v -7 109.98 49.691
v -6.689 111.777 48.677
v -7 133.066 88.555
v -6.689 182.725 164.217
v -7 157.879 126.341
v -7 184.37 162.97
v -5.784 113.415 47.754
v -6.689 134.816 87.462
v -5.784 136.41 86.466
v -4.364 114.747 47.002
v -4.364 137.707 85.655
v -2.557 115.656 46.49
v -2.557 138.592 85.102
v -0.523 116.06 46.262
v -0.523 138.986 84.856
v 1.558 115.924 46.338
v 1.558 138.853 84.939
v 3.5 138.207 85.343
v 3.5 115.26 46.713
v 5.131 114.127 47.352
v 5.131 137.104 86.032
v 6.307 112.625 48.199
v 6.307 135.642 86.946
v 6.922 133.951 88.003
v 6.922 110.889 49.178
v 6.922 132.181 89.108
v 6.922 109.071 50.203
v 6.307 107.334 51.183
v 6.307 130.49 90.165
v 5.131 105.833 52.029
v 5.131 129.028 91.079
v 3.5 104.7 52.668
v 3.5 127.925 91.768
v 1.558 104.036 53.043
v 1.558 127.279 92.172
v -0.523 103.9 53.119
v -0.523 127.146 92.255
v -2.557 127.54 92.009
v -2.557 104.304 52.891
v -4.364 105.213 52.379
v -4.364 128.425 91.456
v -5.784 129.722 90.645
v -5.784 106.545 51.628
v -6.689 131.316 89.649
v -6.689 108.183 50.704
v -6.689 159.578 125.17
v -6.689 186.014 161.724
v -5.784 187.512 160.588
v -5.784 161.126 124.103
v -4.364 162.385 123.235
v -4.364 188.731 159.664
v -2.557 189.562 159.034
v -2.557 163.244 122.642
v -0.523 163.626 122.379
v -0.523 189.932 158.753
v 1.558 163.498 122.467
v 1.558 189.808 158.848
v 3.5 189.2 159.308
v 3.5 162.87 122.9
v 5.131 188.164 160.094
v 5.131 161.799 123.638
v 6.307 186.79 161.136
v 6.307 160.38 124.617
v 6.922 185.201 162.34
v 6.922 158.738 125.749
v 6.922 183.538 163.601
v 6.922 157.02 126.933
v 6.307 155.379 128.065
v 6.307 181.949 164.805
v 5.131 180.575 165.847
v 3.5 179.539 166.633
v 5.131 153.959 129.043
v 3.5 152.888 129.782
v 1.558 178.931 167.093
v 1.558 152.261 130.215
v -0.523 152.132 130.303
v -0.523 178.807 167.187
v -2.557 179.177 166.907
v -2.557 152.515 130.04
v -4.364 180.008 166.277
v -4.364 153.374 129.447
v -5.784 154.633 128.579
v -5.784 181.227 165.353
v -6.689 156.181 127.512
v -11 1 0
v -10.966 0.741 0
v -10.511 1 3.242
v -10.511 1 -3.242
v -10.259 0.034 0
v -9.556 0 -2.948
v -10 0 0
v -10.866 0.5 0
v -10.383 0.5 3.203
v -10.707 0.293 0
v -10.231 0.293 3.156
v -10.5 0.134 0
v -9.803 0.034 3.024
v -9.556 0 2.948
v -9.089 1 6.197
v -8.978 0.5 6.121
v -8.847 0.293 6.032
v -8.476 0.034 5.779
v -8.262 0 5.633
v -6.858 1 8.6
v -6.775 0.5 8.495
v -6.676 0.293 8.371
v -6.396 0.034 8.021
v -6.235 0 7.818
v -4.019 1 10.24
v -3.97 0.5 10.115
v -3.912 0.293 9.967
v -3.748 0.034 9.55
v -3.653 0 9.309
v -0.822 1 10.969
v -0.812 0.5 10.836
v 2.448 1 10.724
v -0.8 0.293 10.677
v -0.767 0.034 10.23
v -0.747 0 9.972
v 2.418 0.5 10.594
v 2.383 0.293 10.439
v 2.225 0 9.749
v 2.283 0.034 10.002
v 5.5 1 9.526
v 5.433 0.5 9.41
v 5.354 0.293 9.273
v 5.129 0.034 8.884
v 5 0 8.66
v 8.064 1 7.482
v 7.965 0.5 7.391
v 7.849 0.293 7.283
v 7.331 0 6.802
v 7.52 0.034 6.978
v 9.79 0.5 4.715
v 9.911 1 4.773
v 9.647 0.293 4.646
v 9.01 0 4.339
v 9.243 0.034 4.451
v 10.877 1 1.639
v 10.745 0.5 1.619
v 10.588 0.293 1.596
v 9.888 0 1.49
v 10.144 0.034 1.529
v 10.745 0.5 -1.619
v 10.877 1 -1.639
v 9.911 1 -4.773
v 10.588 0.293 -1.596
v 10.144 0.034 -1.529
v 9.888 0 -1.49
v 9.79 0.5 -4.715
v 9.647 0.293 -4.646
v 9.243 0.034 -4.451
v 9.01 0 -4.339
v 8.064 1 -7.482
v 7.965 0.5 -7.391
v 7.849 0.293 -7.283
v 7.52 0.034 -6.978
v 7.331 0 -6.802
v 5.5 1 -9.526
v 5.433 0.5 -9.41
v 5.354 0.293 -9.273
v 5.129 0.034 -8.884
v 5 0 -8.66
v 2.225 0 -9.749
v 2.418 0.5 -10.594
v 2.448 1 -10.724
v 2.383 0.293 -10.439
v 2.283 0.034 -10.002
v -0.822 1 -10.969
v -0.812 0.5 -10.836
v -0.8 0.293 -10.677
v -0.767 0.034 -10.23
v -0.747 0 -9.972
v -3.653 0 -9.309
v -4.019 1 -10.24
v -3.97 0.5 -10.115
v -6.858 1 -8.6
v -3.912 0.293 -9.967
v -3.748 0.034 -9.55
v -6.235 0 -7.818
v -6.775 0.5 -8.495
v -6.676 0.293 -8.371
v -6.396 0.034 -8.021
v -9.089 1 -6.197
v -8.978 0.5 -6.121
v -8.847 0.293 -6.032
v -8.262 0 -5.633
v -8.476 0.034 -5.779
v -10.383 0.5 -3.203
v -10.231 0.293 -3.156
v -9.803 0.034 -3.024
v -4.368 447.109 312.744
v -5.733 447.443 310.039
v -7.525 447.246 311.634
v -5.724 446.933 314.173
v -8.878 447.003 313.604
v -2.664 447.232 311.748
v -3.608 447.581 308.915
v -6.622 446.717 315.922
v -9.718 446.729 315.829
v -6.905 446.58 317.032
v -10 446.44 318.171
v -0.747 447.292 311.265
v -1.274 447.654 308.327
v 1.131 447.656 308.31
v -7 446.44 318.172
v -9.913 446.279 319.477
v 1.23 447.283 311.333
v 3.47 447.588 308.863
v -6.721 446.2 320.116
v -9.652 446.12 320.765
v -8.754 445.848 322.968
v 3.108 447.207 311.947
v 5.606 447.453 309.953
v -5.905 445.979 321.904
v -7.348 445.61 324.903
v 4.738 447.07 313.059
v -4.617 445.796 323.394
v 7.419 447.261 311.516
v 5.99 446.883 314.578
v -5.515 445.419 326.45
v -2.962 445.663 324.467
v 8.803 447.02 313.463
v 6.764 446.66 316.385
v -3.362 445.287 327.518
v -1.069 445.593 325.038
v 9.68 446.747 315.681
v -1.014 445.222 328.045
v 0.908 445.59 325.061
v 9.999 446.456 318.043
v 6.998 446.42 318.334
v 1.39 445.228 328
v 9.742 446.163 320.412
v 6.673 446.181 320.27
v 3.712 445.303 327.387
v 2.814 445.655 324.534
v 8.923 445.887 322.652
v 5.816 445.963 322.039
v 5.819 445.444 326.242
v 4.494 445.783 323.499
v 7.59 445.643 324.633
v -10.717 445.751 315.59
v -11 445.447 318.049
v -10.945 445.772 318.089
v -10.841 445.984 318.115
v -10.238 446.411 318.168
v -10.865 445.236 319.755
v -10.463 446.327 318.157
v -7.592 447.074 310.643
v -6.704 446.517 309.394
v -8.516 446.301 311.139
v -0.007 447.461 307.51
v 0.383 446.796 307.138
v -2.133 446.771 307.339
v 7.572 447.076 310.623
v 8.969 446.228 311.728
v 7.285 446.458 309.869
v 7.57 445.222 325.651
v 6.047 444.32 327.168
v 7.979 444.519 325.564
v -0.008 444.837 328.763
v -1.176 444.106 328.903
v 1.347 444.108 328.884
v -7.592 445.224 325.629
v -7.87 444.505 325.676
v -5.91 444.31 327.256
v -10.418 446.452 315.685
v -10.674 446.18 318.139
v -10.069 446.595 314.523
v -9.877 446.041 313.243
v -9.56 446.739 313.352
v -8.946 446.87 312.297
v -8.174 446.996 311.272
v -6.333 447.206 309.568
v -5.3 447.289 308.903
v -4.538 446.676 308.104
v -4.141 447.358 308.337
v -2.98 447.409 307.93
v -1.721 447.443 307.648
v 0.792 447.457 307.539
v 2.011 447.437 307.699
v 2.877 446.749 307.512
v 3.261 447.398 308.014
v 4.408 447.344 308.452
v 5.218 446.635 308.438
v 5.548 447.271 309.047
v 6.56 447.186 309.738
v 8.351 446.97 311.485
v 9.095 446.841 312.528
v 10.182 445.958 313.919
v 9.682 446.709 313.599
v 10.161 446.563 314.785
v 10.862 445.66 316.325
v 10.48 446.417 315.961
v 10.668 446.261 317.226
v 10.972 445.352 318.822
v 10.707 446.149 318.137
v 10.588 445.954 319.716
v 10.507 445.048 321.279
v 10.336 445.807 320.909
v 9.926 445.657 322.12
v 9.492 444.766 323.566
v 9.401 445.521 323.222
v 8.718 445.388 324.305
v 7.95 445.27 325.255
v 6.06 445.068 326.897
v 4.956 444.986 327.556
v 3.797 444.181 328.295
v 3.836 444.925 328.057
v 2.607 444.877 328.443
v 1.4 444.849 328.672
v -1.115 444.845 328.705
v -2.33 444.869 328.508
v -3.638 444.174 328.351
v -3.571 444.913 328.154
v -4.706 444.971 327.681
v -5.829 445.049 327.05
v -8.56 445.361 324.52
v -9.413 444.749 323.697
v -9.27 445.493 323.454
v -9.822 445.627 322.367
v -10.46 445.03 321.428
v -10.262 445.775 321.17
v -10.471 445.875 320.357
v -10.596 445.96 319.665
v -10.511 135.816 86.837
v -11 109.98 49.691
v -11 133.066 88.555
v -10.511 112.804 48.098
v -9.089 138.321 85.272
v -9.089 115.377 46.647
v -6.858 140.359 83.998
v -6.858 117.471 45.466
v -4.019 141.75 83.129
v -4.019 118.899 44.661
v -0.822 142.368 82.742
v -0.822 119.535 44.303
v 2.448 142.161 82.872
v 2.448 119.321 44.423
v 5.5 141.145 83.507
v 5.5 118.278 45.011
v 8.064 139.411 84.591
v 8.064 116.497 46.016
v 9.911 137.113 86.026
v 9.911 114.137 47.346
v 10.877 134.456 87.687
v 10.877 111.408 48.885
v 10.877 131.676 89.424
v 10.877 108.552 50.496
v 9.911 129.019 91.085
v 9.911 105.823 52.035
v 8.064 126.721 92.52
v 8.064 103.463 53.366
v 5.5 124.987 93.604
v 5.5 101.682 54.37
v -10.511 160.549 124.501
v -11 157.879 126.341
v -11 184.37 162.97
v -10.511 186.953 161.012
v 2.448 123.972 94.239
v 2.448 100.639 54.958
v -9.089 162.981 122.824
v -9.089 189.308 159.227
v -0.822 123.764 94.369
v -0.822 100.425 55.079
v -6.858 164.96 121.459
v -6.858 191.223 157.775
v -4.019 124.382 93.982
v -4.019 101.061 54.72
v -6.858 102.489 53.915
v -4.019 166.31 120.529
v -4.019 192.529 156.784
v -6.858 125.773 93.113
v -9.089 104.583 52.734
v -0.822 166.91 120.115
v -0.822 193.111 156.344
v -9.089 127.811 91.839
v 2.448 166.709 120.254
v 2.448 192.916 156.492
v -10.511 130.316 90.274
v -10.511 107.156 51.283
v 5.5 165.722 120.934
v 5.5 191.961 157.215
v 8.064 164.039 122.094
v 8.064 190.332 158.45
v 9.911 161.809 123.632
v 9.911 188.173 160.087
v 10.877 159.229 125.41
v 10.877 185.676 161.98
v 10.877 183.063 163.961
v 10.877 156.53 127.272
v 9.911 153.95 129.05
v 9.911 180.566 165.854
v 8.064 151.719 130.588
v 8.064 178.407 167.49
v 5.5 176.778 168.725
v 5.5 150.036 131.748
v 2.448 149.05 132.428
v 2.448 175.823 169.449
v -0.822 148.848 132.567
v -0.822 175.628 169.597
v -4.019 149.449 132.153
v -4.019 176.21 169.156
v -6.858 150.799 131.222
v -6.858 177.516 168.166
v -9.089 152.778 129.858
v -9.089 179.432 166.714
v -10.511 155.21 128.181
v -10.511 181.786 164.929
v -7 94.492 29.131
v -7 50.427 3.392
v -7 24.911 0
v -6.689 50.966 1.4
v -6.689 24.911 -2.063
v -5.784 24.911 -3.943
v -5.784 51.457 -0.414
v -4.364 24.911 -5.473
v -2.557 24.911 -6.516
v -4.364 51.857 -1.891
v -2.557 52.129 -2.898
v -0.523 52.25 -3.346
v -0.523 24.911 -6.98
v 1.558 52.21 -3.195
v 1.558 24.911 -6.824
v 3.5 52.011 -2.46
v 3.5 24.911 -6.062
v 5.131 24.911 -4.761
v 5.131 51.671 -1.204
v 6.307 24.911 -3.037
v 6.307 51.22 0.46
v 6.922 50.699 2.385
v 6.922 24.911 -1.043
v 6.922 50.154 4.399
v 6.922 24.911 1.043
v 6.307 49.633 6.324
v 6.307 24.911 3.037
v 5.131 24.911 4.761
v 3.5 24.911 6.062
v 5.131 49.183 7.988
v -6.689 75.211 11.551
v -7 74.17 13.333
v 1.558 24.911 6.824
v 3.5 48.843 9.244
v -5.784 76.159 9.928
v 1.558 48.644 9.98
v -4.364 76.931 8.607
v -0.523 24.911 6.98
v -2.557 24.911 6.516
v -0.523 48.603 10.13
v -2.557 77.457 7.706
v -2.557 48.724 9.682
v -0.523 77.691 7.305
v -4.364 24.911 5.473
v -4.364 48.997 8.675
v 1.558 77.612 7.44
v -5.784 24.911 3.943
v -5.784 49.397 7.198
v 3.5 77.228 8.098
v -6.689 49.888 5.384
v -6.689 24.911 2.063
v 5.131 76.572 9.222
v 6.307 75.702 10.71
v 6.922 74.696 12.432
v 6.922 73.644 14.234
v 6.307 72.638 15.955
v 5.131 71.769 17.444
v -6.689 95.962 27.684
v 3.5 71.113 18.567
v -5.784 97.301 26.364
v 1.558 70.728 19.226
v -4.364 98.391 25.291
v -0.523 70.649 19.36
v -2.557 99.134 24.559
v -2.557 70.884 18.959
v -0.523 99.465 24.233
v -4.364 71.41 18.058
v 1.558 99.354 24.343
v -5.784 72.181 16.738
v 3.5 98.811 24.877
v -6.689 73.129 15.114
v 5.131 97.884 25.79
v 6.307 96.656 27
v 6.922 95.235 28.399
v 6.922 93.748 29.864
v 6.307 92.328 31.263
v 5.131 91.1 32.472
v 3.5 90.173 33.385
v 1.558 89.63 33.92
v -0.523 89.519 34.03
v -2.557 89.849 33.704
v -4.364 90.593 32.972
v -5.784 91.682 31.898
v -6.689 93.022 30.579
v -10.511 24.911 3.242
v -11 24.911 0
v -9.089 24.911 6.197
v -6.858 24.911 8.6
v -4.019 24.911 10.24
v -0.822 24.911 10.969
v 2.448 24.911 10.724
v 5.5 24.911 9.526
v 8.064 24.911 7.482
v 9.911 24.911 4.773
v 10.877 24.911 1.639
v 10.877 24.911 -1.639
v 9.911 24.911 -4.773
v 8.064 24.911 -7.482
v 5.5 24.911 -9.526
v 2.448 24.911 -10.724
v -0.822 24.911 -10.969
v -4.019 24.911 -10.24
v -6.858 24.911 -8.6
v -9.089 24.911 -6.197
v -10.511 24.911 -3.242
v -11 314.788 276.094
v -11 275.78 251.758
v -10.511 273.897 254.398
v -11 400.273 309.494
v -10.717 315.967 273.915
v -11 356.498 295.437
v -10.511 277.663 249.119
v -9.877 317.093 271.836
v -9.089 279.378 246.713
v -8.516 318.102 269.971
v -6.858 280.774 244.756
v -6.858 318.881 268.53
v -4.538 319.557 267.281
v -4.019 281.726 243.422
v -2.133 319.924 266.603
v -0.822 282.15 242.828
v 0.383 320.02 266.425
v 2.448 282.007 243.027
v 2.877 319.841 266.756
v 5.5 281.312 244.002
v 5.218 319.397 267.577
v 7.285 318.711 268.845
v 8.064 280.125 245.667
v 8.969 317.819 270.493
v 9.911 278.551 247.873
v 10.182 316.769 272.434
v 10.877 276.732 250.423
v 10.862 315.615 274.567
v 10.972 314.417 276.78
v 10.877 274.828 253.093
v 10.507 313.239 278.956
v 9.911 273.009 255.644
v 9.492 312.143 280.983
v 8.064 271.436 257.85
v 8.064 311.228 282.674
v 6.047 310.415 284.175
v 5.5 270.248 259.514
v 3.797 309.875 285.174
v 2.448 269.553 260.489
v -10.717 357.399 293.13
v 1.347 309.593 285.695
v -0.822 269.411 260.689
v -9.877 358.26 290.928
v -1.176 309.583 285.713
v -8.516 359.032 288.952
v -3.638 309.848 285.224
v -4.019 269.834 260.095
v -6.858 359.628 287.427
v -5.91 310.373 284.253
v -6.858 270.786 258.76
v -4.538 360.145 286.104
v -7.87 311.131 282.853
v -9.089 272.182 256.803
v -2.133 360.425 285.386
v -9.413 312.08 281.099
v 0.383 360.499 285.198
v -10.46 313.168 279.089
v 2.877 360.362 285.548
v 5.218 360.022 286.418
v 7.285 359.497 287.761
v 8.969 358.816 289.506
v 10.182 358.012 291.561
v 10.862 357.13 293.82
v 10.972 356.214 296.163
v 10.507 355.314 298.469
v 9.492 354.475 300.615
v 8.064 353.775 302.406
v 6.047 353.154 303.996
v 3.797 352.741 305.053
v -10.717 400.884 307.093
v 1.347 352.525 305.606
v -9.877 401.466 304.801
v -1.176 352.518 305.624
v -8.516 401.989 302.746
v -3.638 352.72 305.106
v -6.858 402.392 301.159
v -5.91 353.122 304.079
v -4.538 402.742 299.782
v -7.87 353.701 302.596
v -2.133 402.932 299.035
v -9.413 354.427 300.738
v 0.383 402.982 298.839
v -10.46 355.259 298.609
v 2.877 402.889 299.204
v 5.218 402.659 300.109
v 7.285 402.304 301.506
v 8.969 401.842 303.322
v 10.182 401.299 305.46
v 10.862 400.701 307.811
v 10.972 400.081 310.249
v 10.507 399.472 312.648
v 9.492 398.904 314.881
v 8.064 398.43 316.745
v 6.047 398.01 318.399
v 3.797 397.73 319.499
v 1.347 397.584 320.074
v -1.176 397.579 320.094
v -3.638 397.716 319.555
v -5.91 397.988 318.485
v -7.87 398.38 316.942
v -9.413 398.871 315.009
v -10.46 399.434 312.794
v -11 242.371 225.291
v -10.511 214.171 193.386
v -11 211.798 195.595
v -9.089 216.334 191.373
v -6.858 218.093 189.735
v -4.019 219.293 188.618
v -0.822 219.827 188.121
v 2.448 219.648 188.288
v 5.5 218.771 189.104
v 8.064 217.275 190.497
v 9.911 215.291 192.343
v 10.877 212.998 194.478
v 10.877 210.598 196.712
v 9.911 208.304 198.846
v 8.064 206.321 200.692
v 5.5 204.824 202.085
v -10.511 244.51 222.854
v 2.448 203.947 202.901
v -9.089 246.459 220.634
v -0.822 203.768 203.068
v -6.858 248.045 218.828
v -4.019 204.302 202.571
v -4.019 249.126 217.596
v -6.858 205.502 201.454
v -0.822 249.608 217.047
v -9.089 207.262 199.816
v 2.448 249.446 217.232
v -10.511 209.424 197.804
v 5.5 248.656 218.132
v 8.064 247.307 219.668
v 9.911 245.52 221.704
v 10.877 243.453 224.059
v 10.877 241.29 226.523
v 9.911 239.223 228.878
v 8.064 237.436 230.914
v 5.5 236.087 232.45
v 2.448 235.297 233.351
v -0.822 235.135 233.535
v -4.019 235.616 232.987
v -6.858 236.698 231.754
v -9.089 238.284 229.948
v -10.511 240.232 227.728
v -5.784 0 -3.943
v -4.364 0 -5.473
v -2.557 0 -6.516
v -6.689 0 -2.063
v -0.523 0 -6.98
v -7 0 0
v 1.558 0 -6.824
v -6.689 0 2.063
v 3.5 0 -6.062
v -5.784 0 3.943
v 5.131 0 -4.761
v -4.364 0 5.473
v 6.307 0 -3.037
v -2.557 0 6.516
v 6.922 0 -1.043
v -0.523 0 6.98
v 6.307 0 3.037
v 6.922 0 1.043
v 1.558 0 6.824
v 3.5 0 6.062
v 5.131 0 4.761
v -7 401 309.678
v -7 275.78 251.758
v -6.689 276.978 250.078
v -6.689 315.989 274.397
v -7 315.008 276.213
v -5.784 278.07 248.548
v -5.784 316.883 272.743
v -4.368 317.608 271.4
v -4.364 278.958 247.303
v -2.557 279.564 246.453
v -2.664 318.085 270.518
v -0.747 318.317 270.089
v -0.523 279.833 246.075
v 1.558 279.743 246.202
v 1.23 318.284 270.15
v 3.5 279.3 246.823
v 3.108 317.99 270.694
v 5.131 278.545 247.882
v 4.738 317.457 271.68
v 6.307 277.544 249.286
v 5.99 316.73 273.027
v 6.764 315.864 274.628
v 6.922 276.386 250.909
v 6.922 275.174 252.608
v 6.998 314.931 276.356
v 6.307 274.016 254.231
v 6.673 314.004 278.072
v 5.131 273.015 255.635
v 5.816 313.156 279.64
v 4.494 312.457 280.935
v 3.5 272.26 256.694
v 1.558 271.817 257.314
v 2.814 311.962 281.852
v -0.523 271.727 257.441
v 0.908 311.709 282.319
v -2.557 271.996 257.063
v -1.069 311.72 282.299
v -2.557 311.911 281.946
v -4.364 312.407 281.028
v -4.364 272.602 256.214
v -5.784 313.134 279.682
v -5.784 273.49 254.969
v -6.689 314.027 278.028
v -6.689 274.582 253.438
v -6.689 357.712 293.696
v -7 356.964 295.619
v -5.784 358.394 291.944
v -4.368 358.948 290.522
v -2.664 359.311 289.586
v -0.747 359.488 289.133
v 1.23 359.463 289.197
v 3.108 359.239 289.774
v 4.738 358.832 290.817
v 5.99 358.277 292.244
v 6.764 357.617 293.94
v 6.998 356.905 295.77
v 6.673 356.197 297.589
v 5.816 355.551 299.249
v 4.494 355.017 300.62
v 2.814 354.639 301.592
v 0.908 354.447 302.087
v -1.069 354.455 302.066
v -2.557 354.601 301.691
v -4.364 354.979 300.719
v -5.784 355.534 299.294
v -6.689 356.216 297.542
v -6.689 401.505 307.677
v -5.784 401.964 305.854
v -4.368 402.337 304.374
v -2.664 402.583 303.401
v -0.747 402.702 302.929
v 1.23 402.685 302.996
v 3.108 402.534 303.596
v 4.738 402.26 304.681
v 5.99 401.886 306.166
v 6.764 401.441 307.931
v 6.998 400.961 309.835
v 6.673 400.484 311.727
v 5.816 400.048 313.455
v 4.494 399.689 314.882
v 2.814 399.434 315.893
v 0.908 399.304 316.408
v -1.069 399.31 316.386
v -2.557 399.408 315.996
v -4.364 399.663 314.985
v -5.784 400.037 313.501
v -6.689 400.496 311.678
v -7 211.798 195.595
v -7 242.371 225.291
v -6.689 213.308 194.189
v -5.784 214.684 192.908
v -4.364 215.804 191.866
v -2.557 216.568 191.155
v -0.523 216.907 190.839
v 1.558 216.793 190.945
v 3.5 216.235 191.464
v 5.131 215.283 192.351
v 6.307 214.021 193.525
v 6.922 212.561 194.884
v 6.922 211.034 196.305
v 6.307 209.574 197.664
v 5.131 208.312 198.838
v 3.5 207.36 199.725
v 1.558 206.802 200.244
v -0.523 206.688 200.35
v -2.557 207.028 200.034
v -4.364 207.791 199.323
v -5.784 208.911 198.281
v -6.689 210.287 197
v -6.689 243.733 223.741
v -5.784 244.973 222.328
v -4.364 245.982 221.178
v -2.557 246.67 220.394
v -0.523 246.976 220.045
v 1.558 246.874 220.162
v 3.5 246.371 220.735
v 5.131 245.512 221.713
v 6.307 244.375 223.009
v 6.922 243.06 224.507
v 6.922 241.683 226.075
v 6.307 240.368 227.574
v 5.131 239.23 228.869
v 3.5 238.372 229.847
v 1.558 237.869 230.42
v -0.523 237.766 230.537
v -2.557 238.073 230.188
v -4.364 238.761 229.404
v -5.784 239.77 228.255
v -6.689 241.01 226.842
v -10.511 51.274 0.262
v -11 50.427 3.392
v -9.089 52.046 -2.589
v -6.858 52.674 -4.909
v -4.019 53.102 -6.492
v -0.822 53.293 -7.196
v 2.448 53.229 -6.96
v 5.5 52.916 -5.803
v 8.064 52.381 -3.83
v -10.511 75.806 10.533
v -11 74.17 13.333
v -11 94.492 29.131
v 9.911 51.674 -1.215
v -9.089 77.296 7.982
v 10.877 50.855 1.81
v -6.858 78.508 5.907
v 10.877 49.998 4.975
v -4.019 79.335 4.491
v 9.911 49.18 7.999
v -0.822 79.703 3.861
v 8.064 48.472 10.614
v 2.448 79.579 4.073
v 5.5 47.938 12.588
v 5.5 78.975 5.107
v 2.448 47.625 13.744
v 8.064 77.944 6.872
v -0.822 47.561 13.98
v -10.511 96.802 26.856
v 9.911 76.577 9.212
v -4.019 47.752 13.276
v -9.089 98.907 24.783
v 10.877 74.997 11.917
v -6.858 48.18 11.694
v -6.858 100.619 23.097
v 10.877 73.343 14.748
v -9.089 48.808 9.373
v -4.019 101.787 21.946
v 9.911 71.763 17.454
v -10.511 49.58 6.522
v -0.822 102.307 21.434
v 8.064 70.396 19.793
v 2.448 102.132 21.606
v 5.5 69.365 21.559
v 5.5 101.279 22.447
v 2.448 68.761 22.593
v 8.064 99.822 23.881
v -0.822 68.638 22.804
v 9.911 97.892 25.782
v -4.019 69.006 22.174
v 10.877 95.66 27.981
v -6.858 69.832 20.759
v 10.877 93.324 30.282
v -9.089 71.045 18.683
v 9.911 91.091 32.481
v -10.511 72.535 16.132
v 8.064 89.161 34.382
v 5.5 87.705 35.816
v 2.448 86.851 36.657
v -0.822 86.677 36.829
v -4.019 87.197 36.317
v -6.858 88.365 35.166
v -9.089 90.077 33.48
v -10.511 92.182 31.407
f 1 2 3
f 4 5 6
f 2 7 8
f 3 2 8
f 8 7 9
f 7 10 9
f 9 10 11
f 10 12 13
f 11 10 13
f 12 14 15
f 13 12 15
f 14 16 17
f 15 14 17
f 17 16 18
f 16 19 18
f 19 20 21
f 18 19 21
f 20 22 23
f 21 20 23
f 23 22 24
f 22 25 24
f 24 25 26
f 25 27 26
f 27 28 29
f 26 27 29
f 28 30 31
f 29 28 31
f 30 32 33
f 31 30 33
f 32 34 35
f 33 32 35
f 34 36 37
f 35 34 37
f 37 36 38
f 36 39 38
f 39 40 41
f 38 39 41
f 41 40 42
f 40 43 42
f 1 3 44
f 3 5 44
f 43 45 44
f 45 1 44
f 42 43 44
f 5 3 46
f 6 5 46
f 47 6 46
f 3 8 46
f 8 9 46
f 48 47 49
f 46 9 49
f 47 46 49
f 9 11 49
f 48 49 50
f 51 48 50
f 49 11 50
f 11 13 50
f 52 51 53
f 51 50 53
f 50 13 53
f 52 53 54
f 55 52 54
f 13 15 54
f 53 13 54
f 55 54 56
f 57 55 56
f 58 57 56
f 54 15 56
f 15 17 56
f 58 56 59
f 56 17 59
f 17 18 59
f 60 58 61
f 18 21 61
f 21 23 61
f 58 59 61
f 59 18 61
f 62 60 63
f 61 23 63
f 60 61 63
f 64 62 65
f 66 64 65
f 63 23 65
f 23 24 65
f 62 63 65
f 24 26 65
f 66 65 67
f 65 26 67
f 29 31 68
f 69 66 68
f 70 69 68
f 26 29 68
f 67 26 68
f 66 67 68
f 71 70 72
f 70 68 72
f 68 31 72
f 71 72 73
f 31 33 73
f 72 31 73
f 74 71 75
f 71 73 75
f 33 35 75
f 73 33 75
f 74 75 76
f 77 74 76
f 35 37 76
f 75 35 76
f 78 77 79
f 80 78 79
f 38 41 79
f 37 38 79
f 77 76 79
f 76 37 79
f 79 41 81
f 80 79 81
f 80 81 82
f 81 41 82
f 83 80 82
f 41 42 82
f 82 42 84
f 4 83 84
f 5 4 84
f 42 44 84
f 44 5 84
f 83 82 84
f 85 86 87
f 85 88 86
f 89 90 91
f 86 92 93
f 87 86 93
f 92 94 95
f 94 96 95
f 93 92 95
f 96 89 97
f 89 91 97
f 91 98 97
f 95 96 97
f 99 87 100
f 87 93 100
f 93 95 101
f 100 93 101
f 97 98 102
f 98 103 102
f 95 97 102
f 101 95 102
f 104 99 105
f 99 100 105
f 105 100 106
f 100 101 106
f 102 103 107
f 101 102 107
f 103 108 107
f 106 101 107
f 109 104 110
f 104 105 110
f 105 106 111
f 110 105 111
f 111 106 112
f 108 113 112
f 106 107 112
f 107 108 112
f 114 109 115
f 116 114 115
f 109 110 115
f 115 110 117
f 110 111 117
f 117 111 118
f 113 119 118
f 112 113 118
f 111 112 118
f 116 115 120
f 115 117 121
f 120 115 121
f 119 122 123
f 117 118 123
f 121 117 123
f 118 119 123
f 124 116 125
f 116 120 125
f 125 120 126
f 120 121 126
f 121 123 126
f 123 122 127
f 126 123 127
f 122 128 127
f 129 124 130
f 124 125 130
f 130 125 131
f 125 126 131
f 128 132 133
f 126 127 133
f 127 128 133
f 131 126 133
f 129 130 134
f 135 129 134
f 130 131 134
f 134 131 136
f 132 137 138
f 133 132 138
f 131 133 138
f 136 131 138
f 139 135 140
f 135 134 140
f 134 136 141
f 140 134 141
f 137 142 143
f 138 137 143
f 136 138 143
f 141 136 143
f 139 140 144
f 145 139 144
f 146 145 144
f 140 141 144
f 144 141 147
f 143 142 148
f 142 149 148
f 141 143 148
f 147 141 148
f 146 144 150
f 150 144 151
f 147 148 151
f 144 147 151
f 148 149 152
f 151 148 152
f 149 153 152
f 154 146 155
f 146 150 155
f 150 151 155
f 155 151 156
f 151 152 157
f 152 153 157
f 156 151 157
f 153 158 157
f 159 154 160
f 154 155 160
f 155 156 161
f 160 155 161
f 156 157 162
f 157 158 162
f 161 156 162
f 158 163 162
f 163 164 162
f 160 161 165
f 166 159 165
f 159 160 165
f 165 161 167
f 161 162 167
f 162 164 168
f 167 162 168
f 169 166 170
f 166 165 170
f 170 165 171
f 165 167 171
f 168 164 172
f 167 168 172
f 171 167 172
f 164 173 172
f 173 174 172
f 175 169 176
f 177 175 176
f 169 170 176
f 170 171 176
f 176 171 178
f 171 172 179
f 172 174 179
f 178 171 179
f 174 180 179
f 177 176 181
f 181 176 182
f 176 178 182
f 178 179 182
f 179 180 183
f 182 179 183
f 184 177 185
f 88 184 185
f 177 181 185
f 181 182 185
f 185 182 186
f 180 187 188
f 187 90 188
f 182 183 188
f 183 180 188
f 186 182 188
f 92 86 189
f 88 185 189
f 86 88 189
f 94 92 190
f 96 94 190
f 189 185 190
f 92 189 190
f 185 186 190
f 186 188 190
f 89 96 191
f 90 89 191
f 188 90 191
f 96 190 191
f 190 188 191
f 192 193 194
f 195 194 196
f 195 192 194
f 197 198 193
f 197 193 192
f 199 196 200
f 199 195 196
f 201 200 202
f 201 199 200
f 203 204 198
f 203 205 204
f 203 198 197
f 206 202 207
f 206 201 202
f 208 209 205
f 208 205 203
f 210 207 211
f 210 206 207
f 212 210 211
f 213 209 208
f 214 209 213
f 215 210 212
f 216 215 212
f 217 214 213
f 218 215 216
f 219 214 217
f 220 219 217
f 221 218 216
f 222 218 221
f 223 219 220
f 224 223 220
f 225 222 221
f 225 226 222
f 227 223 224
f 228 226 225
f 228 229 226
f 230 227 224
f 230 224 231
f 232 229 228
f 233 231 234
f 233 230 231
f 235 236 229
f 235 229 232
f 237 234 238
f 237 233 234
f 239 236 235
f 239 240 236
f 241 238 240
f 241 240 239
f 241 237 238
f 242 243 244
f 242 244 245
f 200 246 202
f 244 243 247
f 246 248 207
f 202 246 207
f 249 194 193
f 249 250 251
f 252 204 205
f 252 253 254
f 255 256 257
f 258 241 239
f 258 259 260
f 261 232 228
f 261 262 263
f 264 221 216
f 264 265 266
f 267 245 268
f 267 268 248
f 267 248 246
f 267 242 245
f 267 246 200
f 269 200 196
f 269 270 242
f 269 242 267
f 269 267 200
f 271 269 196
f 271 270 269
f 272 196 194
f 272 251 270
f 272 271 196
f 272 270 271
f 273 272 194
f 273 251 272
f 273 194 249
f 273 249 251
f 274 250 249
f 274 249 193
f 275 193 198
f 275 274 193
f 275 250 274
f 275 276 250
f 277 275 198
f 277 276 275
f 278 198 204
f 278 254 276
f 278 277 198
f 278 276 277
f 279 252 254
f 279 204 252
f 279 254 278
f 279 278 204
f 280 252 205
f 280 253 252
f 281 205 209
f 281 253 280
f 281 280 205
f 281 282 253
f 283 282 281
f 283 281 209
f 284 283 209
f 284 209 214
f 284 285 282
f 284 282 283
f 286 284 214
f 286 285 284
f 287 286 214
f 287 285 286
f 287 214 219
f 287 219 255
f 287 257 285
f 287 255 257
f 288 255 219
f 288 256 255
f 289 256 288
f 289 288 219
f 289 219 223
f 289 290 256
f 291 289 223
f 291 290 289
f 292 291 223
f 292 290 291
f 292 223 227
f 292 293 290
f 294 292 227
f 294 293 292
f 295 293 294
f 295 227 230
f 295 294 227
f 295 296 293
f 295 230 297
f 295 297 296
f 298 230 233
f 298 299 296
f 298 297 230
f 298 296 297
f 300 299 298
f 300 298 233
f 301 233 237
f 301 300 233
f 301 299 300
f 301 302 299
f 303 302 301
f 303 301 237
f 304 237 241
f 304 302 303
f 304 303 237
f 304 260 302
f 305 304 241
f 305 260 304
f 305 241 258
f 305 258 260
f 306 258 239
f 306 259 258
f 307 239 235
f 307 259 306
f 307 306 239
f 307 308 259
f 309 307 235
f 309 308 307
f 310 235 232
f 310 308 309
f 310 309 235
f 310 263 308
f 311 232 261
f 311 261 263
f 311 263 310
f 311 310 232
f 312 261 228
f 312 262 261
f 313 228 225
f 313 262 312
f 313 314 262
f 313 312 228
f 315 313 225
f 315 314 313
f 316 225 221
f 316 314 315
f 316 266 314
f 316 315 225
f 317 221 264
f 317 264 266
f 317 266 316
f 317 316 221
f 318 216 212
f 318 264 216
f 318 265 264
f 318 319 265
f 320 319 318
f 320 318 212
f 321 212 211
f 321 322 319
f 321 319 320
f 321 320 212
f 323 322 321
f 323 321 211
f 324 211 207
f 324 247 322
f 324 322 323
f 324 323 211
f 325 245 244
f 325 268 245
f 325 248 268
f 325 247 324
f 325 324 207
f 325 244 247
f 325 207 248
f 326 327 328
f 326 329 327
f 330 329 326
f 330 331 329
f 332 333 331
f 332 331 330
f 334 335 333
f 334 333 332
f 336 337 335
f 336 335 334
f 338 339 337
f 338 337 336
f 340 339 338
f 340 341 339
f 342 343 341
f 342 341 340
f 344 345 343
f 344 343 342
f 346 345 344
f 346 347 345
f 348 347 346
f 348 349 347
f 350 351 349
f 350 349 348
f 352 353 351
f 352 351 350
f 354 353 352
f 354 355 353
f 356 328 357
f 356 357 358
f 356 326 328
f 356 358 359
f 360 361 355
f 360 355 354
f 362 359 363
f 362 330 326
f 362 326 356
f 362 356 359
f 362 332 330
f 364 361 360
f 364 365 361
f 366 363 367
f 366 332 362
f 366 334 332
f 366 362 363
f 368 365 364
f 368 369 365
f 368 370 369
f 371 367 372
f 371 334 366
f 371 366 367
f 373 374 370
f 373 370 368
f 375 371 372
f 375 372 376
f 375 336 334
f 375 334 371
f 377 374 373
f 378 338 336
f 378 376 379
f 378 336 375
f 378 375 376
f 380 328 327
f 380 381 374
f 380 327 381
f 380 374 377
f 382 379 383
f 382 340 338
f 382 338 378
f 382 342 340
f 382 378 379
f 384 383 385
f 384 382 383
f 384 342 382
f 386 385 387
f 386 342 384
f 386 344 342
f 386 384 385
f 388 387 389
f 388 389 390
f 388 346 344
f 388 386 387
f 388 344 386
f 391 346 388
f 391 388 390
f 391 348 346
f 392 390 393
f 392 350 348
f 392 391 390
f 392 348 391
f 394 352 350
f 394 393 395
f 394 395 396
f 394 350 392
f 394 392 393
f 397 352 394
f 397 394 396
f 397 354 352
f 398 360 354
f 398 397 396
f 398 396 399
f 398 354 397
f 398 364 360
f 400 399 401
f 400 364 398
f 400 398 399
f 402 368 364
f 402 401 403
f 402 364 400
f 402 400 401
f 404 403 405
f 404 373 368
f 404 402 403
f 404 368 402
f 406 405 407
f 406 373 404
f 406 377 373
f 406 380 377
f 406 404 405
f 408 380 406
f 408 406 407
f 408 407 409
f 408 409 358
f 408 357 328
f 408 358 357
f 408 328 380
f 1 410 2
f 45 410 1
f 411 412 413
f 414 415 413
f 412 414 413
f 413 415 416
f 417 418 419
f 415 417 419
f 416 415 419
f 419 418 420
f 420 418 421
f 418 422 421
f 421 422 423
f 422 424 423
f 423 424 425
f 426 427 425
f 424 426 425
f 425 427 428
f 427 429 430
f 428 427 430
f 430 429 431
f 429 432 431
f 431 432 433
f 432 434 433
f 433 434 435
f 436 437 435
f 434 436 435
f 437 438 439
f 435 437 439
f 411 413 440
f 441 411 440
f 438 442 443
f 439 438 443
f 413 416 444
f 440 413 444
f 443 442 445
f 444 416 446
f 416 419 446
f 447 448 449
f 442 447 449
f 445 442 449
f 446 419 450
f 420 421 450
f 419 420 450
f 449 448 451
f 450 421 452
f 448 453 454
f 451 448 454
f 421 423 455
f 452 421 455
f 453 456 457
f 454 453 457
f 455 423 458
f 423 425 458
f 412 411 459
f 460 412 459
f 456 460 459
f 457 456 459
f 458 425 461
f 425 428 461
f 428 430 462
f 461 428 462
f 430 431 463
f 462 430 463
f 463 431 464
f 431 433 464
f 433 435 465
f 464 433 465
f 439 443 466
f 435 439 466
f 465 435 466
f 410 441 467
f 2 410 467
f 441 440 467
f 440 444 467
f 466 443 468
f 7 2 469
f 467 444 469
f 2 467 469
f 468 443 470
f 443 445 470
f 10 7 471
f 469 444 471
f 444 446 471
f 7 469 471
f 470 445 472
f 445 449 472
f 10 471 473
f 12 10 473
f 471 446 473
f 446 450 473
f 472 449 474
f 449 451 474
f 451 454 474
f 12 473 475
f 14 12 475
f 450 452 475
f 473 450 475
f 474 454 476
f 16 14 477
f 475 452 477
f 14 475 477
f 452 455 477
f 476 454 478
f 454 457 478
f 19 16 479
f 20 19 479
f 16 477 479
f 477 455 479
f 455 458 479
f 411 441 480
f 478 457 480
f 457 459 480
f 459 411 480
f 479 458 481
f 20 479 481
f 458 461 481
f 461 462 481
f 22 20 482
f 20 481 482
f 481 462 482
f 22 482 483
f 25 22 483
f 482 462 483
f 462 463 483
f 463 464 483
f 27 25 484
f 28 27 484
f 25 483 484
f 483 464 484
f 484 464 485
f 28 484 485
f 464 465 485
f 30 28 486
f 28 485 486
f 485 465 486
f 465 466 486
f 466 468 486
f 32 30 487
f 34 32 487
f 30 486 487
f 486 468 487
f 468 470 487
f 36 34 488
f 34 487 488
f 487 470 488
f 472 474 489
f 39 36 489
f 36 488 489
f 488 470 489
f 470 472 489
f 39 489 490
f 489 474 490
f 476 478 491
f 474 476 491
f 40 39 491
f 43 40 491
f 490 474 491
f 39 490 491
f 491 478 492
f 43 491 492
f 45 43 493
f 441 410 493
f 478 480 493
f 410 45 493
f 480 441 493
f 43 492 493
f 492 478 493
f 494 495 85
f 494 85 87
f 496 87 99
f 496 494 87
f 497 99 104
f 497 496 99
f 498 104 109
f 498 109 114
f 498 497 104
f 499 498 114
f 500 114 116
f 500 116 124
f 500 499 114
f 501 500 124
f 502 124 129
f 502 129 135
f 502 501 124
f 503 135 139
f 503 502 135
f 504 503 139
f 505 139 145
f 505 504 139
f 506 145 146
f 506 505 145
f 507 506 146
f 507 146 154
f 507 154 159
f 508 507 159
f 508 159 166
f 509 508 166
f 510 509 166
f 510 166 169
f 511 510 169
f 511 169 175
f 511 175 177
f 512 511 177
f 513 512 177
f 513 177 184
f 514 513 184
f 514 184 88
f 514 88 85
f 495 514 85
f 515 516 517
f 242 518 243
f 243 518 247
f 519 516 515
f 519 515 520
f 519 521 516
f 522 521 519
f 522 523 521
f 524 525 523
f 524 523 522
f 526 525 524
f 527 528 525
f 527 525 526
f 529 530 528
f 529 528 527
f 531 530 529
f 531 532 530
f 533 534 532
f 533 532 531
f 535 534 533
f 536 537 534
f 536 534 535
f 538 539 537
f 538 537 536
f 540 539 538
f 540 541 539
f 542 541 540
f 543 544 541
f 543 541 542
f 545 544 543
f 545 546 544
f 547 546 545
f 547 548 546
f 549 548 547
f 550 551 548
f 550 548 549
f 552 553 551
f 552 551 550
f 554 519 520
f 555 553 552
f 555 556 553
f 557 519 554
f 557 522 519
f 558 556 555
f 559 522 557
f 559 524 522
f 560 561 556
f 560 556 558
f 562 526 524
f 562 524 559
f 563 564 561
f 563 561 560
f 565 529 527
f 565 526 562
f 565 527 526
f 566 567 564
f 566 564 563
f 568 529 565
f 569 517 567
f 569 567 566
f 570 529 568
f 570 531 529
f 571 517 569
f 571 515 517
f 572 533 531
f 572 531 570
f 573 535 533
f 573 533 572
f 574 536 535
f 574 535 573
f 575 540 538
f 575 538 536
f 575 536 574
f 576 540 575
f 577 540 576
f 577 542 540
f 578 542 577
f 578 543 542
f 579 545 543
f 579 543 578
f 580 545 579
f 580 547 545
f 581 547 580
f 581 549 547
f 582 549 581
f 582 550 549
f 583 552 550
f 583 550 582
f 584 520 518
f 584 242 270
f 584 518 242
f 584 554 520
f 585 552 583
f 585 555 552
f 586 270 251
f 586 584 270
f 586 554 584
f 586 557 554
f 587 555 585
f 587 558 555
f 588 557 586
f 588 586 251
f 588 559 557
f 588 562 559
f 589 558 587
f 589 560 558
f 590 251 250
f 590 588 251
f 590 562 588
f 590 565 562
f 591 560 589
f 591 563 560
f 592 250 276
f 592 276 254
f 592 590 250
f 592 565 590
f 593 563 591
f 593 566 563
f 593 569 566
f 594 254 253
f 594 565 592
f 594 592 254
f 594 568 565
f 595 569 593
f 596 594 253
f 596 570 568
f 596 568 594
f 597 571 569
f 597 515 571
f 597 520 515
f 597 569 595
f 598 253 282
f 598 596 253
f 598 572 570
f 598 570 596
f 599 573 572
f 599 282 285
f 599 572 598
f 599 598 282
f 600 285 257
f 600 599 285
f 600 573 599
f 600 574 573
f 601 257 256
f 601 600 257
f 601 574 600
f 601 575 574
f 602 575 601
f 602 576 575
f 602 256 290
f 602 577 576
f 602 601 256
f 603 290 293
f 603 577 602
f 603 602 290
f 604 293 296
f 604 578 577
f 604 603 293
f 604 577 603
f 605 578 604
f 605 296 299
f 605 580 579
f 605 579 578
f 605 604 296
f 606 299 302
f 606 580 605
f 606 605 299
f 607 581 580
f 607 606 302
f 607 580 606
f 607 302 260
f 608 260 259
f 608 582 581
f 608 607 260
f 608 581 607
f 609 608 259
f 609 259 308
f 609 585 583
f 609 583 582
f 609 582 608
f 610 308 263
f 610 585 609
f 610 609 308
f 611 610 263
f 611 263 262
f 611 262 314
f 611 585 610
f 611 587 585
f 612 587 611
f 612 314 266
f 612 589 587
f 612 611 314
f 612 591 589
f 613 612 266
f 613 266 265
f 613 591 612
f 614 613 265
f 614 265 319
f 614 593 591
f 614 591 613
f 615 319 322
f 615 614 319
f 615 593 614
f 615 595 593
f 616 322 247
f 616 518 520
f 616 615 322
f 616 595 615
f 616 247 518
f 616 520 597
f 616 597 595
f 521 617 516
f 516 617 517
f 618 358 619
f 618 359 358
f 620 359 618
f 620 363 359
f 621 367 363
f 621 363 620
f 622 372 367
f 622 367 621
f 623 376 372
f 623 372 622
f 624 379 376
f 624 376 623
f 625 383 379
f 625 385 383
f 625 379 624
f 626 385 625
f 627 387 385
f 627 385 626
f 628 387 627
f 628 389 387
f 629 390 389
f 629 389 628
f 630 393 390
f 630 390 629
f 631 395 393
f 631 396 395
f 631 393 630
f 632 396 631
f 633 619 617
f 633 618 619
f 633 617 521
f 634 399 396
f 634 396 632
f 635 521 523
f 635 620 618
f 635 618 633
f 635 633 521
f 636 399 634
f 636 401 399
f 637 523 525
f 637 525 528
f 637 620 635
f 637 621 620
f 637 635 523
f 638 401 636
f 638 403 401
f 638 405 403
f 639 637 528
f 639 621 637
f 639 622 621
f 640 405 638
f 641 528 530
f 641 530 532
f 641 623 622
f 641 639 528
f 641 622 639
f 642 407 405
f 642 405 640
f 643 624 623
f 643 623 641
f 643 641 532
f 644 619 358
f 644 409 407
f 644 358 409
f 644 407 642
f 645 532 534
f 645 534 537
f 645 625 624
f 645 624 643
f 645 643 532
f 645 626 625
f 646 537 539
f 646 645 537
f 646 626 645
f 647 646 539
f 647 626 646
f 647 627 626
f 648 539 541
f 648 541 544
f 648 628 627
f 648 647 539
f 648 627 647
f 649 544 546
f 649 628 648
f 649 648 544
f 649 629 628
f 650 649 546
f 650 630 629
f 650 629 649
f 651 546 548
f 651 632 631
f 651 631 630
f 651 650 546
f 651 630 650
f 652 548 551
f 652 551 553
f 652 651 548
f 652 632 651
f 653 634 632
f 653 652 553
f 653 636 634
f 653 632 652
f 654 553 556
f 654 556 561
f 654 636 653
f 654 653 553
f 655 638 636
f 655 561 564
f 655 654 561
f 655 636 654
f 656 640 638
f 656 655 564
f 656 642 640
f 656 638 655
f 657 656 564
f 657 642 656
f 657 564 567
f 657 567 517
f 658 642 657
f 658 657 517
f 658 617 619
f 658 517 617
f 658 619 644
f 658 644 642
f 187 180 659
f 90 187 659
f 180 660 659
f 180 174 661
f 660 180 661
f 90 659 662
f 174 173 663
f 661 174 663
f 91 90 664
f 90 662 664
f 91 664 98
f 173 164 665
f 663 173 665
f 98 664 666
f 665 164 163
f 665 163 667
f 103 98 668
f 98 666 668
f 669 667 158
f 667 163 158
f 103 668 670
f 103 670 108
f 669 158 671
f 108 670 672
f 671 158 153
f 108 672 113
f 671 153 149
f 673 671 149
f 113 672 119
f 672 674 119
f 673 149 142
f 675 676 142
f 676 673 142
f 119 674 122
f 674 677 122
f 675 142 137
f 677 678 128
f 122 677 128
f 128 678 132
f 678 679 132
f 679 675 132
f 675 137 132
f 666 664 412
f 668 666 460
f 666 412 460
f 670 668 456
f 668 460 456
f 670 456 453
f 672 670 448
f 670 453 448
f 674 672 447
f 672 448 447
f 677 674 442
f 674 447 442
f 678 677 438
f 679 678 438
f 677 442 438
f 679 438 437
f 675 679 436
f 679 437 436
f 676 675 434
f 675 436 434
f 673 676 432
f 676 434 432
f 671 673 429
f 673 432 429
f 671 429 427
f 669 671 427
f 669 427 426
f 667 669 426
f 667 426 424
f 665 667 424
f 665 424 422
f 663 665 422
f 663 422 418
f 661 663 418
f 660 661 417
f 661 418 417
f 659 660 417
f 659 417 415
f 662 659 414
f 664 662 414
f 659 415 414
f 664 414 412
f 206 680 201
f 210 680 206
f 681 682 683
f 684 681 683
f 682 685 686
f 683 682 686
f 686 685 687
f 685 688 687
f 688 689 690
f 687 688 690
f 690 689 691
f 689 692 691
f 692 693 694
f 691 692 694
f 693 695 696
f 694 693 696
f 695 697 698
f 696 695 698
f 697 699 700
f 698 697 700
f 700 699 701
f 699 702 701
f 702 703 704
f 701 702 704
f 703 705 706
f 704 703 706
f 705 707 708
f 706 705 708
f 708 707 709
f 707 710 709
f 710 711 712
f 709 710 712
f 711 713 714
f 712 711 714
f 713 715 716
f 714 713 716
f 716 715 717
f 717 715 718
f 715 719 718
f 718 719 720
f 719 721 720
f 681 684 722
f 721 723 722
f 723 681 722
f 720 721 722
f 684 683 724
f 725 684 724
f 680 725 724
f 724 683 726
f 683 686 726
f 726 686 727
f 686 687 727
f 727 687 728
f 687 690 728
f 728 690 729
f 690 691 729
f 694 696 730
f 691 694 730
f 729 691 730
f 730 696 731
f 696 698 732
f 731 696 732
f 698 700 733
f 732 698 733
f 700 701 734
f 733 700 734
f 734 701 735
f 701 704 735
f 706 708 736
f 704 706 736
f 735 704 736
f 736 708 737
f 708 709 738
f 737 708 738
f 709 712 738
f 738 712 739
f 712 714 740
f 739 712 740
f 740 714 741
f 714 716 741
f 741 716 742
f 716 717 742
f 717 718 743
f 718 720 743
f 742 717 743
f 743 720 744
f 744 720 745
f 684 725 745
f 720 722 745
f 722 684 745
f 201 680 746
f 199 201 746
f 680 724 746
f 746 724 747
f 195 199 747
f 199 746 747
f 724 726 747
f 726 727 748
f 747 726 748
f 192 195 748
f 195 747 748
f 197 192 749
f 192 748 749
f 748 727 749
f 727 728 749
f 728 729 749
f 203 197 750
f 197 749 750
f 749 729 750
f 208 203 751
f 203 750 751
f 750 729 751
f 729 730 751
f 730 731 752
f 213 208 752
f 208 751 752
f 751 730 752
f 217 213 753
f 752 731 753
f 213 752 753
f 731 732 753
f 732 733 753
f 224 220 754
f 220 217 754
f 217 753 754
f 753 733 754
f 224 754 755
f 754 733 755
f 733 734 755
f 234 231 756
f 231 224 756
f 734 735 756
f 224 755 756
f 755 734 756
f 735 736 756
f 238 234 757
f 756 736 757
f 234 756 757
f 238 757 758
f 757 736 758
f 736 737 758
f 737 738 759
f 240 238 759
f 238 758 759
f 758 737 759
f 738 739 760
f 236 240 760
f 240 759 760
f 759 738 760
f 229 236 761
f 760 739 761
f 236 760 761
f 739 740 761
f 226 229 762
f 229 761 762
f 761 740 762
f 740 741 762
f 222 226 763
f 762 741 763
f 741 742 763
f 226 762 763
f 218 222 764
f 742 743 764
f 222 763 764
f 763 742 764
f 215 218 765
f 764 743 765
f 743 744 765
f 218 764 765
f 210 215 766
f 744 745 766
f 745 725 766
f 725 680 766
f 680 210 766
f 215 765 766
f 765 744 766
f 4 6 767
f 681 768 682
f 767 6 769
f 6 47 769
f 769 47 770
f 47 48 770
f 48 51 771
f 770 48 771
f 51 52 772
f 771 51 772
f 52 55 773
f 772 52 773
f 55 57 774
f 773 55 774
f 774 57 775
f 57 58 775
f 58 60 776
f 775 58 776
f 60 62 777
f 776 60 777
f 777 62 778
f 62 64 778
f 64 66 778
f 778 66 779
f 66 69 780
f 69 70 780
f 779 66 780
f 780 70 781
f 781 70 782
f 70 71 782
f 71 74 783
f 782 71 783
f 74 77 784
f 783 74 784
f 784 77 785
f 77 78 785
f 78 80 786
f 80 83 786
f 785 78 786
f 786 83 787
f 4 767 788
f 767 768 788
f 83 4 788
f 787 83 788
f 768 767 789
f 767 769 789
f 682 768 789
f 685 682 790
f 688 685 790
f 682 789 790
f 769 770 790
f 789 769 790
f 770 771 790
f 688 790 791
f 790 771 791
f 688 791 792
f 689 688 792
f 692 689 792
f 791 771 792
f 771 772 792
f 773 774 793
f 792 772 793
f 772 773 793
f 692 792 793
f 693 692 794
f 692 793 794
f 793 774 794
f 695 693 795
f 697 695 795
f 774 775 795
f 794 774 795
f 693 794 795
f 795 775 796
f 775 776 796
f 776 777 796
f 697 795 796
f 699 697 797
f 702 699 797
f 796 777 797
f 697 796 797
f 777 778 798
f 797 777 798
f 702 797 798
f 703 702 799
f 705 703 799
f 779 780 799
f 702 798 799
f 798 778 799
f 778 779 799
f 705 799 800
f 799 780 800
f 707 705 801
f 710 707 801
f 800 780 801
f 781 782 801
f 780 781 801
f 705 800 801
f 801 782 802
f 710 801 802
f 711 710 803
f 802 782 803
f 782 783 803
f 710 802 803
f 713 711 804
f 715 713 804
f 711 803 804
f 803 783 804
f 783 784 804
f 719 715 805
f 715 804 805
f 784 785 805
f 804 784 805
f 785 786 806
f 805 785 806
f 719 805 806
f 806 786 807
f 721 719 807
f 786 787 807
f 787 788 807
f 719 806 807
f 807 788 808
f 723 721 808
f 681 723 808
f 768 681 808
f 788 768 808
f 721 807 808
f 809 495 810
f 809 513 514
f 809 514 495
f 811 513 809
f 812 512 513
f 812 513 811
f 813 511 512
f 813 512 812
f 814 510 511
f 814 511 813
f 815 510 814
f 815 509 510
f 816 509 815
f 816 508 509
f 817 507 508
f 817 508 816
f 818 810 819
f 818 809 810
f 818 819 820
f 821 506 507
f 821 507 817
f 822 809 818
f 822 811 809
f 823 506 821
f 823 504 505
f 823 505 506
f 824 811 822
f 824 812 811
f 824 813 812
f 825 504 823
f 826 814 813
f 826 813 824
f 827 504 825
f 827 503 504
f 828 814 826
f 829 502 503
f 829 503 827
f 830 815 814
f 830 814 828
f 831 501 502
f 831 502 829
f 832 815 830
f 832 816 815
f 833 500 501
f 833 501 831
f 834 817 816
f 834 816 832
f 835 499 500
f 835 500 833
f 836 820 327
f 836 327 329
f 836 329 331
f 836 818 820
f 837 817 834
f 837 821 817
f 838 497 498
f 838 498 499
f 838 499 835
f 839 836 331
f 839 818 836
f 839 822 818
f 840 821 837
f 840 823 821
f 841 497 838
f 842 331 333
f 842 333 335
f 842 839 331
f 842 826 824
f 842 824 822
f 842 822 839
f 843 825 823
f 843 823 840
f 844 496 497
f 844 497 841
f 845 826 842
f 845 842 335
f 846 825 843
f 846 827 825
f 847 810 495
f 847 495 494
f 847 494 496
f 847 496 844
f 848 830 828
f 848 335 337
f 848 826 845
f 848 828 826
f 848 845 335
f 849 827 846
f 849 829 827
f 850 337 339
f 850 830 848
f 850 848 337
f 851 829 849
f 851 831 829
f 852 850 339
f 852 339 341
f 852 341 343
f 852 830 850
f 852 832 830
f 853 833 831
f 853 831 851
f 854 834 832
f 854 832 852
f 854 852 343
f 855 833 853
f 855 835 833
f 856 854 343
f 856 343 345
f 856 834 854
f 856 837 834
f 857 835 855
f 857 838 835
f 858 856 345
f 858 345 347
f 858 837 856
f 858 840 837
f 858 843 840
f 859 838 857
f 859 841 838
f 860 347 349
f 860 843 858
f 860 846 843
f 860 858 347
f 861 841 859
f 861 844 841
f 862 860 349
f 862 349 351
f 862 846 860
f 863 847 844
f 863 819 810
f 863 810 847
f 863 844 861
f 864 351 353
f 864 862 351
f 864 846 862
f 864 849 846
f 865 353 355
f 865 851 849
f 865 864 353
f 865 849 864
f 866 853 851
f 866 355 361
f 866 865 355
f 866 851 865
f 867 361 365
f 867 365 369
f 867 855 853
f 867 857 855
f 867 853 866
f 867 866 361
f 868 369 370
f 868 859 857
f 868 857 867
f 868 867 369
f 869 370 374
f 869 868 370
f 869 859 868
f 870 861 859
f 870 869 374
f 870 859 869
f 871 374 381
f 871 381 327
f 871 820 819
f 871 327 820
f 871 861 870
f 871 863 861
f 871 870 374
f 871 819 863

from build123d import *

# Parameters (mm, degrees)
CROQUIS11_R = 11
VACIADO5_T  = -4
REDONDEO3_R = 1


with BuildPart() as part:
    # Barrer4: sweep along a path in Croquis10
    with BuildLine(Plane(origin=(0, 0, 0), x_dir=(0, 0, -1), z_dir=(-1, 0, 0))) as barrer4_path:
        Line((0, 0), (0, -24.910858202))
        ThreePointArc((0, -24.910858202), (-13.332739449, -74.170158996), (-49.690658823, -109.979967076))
        ThreePointArc((-49.690658823, -109.979967076), (-107.587992383, -145.259844558), (-162.97033395, -184.369526621))
        ThreePointArc((-162.97033395, -184.369526621), (-210.828414492, -226.710036816), (-251.758207116, -275.780055692))
        ThreePointArc((-251.758207116, -275.780055692), (-295.61896572, -356.963847424), (-318.172480576, -446.439615948))
    # Croquis11 → Barrer4 (sweep)
    with BuildSketch(Plane(origin=(0, 0, 0), x_dir=(-1, 0, 0), z_dir=(0, 1, 0))):
        Circle(CROQUIS11_R)
    sweep(path=barrer4_path.line)

    # Vaciado5
    vaciado5_openings = [part.faces().sort_by_distance(p)[0] for p in [
        (0, 446.439615948, 318.172480576),
        (0, 0, 0),
    ]]
    offset(amount=VACIADO5_T, openings=vaciado5_openings, kind=Kind.INTERSECTION)

    # Redondeo3
    redondeo3_edges = [part.edges().sort_by_distance(p)[0] for p in [
        (11, 0, 0),
        (11, 446.439615948, 318.172480576),
    ]]
    fillet(redondeo3_edges, radius=REDONDEO3_R)


solid = part.part
